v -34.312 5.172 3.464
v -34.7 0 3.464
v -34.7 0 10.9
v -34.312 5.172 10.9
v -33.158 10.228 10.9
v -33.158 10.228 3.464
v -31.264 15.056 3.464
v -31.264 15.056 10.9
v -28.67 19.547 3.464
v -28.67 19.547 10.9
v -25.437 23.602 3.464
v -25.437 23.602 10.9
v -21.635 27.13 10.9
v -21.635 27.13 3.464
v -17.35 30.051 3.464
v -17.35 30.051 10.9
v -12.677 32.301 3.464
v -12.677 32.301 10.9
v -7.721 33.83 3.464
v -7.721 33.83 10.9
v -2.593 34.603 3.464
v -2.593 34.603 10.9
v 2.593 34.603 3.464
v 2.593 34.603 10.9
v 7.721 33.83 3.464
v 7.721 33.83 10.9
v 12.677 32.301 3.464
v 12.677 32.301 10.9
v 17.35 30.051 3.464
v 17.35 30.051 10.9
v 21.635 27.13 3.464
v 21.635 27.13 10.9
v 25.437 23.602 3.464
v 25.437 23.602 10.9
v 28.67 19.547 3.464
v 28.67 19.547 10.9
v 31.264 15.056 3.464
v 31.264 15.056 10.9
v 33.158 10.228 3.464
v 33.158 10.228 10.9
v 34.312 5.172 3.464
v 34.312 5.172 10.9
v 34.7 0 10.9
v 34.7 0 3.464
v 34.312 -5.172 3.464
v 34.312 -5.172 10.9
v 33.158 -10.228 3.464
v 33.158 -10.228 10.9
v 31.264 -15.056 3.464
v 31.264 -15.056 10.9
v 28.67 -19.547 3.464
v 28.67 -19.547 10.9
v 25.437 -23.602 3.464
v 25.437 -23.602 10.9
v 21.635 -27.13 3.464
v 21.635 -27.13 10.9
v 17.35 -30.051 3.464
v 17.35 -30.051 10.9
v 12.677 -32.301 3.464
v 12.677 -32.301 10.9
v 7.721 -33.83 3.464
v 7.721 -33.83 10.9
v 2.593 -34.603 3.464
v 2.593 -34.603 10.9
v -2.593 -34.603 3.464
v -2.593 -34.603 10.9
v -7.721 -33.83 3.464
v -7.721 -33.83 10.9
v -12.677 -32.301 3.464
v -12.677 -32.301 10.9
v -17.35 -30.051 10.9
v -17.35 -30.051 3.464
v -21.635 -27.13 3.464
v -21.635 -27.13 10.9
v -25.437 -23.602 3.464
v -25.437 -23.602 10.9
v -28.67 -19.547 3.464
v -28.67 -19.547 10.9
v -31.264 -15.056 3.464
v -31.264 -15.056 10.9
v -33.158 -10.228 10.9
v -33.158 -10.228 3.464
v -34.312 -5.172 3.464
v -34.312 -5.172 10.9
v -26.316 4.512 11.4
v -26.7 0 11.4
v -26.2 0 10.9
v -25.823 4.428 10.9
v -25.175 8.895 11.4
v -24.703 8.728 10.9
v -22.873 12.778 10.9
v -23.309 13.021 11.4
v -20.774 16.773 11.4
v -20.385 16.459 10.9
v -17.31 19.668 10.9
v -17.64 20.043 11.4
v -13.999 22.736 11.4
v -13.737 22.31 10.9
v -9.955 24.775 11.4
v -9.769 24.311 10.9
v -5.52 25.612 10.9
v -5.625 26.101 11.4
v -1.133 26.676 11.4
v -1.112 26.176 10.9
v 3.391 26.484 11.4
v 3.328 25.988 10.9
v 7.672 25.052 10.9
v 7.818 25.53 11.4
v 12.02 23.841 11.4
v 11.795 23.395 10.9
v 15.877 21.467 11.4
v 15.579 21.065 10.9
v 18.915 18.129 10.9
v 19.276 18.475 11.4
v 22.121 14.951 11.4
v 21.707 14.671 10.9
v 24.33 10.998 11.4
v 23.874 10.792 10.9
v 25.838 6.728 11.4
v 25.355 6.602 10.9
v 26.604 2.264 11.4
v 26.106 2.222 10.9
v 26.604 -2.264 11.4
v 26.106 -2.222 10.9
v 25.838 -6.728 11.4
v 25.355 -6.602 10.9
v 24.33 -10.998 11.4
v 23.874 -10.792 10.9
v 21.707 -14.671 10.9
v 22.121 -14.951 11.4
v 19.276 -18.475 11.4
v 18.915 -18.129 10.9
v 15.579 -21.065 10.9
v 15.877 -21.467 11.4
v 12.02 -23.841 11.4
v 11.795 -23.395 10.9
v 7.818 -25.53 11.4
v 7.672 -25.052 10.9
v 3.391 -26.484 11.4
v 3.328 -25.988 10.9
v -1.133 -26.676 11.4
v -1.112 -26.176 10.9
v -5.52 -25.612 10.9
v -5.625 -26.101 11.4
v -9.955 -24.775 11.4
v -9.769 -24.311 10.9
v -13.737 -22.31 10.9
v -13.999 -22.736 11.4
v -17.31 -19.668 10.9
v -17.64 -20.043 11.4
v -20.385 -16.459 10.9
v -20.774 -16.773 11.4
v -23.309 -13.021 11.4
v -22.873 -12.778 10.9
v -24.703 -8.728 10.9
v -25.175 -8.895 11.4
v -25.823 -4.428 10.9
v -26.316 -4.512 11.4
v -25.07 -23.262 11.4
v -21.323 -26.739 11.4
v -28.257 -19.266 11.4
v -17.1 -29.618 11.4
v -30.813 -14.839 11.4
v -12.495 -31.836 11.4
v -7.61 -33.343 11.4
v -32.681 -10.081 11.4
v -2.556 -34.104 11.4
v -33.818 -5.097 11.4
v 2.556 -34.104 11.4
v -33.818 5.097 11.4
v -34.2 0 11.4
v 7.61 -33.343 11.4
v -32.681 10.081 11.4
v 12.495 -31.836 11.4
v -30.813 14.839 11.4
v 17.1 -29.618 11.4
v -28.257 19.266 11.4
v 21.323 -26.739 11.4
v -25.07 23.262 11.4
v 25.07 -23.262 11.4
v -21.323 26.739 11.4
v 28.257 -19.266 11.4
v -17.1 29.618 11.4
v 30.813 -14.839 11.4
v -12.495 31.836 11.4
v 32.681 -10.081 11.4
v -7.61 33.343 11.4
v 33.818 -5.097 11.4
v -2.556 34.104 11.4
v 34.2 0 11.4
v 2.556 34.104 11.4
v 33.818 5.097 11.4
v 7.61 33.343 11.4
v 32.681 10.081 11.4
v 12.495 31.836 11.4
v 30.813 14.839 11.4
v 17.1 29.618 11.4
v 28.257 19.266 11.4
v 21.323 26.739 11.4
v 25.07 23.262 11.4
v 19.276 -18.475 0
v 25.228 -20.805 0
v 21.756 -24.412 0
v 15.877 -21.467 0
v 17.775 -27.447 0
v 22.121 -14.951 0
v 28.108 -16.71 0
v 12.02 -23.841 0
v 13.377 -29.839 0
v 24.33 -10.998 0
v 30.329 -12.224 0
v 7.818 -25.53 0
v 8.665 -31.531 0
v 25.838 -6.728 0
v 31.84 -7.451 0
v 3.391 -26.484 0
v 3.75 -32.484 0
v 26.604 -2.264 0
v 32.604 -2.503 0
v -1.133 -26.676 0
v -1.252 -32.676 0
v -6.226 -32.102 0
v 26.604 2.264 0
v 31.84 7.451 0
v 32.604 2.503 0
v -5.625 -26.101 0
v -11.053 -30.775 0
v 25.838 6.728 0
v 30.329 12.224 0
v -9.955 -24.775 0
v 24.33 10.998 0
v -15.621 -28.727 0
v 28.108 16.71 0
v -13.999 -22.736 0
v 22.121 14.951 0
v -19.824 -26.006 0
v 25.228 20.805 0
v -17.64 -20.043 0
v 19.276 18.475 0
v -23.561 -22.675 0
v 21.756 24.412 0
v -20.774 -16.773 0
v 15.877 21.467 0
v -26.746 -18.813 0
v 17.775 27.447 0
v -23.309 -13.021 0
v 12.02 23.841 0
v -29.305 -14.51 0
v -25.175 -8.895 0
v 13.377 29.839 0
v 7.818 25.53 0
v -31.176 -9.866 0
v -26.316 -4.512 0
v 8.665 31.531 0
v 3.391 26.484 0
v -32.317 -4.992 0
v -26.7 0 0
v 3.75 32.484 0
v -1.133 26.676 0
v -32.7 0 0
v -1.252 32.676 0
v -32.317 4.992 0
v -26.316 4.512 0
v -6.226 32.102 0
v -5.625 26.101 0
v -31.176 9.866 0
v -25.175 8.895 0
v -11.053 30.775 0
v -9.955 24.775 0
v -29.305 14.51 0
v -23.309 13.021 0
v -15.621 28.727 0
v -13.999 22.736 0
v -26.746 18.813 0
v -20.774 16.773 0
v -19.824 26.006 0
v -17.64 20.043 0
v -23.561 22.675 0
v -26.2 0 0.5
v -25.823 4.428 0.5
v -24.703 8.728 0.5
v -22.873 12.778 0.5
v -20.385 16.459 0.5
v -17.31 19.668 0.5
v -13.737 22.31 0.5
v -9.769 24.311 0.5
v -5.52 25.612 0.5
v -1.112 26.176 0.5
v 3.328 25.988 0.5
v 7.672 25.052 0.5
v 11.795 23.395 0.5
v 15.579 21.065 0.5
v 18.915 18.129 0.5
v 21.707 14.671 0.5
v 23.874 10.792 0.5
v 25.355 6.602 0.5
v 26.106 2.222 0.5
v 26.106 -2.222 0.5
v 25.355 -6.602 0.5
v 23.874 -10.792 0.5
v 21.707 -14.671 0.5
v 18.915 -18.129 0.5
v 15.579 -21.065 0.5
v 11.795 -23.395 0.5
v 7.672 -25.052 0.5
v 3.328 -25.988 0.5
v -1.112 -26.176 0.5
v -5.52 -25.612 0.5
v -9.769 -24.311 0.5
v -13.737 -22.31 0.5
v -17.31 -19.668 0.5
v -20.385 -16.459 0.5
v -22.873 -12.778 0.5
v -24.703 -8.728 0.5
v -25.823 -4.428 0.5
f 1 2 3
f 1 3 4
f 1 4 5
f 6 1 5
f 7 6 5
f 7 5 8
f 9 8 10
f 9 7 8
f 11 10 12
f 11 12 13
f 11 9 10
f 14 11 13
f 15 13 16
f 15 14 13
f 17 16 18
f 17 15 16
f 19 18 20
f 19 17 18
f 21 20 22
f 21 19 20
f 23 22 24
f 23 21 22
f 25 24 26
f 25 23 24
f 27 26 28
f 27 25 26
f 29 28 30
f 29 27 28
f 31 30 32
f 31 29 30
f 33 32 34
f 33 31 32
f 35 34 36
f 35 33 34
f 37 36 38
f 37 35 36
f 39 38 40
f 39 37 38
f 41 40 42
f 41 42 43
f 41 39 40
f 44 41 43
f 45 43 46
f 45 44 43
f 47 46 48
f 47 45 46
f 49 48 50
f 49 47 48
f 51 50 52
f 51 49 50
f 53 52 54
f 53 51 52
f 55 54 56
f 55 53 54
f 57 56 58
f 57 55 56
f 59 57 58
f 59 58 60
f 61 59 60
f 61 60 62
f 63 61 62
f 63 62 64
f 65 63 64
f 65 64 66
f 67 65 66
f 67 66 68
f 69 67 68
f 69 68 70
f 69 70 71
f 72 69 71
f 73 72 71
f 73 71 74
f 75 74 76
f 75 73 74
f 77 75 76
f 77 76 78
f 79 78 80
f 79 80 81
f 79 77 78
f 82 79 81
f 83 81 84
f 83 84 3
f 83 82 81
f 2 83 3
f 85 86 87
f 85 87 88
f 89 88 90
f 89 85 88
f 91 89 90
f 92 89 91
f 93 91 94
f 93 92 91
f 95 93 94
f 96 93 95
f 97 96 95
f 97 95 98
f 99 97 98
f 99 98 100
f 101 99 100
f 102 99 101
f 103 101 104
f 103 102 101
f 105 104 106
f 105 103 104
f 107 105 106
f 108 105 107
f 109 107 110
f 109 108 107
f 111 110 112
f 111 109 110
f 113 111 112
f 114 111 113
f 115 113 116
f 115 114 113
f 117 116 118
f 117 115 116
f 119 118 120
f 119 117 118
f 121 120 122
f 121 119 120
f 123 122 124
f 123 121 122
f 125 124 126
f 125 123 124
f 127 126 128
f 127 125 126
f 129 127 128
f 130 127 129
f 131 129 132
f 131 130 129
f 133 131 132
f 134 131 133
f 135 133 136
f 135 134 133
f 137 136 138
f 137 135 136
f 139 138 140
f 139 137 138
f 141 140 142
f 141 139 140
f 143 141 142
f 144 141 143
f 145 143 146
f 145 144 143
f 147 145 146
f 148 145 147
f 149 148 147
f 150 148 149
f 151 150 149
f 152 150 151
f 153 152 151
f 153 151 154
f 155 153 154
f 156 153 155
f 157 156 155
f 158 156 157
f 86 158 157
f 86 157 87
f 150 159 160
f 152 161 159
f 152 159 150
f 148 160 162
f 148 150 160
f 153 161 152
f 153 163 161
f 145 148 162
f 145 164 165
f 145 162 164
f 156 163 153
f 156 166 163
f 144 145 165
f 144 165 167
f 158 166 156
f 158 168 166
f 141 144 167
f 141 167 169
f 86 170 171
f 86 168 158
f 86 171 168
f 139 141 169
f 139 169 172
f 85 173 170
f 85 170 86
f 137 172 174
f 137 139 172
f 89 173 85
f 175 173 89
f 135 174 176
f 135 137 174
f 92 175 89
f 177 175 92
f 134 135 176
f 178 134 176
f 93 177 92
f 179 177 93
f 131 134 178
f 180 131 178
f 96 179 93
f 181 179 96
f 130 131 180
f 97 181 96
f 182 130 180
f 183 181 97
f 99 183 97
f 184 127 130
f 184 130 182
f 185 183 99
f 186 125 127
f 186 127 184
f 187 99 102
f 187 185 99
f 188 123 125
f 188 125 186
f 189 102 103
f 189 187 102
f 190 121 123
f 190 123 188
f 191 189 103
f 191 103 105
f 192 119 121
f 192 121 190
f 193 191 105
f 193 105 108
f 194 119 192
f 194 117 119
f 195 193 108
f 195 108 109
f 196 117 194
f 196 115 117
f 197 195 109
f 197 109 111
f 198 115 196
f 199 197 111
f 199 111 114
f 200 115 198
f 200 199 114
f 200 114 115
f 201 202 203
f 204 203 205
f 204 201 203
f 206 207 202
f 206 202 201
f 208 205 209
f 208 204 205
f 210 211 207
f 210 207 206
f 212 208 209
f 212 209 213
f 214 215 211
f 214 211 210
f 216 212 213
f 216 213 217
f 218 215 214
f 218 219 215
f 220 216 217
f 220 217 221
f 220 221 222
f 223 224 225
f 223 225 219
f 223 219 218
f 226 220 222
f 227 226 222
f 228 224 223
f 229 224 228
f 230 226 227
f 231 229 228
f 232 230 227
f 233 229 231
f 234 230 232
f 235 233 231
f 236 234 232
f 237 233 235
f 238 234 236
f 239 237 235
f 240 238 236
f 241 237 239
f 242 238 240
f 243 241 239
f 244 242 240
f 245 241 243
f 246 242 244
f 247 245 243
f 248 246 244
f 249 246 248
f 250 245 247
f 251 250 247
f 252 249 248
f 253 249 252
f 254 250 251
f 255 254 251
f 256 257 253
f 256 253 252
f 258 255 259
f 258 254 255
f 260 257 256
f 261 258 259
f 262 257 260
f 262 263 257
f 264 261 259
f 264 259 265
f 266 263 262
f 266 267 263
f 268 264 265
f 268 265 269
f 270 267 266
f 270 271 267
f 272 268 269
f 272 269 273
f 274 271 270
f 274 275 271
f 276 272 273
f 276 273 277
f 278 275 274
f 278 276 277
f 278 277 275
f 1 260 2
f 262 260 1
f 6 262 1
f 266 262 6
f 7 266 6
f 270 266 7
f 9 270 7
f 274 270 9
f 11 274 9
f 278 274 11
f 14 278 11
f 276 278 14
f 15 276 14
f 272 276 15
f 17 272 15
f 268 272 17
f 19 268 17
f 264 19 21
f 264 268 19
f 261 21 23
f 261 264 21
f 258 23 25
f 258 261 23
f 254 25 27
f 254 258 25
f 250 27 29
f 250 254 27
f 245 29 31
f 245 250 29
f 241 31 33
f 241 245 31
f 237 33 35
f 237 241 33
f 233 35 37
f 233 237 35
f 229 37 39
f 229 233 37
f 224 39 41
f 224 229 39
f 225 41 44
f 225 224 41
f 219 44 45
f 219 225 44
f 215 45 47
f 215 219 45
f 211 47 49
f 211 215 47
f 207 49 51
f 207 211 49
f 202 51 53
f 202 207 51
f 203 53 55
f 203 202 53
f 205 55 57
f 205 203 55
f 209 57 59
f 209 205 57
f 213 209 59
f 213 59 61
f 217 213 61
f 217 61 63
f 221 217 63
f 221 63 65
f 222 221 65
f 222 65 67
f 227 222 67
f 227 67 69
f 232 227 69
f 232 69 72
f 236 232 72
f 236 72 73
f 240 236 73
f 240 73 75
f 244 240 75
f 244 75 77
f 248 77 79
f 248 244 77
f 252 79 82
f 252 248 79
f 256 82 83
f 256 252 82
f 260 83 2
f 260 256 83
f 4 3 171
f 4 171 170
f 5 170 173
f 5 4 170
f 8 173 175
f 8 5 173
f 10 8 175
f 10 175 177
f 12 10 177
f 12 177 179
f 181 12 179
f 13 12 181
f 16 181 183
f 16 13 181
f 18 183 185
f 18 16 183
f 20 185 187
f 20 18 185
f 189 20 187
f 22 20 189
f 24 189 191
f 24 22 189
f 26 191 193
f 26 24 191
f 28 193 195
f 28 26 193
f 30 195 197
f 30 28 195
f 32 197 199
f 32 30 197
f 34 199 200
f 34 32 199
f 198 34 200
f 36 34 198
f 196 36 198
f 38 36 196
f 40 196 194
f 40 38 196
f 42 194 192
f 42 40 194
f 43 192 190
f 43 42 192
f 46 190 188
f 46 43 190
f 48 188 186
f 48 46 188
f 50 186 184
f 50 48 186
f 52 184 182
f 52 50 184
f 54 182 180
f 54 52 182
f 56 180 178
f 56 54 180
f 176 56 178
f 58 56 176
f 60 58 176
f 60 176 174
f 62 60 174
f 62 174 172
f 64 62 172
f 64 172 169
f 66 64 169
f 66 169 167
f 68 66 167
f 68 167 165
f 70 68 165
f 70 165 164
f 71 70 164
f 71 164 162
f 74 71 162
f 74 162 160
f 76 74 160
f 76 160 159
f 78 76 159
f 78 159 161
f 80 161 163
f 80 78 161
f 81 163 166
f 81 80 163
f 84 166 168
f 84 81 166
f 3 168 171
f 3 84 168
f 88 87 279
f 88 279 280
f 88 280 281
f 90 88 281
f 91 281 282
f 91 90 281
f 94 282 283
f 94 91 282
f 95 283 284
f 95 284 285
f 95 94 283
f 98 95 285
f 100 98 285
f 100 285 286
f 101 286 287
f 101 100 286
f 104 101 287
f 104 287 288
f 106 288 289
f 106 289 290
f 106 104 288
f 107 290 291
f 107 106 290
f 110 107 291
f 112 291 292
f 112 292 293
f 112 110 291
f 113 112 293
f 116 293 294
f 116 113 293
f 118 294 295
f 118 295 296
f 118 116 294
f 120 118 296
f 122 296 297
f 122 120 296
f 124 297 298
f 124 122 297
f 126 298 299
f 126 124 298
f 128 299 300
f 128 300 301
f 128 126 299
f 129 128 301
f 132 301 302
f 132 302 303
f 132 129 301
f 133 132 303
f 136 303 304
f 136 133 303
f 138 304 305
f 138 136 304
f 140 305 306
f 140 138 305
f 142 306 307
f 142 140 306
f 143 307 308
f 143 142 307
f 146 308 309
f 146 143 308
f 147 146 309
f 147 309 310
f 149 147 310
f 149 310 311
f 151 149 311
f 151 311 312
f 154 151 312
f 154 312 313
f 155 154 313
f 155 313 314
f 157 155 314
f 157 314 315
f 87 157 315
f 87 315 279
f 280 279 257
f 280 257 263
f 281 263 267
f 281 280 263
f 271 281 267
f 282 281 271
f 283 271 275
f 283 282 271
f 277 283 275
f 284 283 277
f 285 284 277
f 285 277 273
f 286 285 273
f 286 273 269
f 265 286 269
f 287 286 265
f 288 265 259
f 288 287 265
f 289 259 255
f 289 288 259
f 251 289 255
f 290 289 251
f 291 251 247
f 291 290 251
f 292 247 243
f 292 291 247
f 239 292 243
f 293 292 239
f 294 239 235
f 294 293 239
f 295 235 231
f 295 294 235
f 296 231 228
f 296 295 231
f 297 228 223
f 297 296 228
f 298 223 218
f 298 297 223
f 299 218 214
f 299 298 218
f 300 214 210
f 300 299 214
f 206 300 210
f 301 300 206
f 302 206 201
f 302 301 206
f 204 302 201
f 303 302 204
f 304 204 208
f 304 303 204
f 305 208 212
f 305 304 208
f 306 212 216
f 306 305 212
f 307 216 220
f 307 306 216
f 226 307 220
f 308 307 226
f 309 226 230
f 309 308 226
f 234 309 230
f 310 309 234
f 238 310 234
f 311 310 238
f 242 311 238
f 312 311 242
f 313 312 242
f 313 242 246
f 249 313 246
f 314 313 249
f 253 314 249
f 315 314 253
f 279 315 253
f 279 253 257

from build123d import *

# Parameters (mm, degrees)
F2_SIZE = 0.5


with BuildPart() as f1:
    # F0 (on Front) → F1 (revolve)
    with BuildSketch(Plane.XZ):
        Polygon((-32.7, 0), (-26.2, 0), (-26.2, 11.4), (-34.7, 11.4), (-34.7, 3.464102), align=None)
    revolve(axis=Axis((0, 0, 86.271172), (0, 0, -1)))

    # F2
    f2_edges = [f1.edges().sort_by_distance(p)[0] for p in [
        (26.2, 0, 11.4),
        (34.7, 0, 11.4),
        (26.2, 0, 0),
    ]]
    chamfer(f2_edges, length=F2_SIZE)


solid = f1.part
